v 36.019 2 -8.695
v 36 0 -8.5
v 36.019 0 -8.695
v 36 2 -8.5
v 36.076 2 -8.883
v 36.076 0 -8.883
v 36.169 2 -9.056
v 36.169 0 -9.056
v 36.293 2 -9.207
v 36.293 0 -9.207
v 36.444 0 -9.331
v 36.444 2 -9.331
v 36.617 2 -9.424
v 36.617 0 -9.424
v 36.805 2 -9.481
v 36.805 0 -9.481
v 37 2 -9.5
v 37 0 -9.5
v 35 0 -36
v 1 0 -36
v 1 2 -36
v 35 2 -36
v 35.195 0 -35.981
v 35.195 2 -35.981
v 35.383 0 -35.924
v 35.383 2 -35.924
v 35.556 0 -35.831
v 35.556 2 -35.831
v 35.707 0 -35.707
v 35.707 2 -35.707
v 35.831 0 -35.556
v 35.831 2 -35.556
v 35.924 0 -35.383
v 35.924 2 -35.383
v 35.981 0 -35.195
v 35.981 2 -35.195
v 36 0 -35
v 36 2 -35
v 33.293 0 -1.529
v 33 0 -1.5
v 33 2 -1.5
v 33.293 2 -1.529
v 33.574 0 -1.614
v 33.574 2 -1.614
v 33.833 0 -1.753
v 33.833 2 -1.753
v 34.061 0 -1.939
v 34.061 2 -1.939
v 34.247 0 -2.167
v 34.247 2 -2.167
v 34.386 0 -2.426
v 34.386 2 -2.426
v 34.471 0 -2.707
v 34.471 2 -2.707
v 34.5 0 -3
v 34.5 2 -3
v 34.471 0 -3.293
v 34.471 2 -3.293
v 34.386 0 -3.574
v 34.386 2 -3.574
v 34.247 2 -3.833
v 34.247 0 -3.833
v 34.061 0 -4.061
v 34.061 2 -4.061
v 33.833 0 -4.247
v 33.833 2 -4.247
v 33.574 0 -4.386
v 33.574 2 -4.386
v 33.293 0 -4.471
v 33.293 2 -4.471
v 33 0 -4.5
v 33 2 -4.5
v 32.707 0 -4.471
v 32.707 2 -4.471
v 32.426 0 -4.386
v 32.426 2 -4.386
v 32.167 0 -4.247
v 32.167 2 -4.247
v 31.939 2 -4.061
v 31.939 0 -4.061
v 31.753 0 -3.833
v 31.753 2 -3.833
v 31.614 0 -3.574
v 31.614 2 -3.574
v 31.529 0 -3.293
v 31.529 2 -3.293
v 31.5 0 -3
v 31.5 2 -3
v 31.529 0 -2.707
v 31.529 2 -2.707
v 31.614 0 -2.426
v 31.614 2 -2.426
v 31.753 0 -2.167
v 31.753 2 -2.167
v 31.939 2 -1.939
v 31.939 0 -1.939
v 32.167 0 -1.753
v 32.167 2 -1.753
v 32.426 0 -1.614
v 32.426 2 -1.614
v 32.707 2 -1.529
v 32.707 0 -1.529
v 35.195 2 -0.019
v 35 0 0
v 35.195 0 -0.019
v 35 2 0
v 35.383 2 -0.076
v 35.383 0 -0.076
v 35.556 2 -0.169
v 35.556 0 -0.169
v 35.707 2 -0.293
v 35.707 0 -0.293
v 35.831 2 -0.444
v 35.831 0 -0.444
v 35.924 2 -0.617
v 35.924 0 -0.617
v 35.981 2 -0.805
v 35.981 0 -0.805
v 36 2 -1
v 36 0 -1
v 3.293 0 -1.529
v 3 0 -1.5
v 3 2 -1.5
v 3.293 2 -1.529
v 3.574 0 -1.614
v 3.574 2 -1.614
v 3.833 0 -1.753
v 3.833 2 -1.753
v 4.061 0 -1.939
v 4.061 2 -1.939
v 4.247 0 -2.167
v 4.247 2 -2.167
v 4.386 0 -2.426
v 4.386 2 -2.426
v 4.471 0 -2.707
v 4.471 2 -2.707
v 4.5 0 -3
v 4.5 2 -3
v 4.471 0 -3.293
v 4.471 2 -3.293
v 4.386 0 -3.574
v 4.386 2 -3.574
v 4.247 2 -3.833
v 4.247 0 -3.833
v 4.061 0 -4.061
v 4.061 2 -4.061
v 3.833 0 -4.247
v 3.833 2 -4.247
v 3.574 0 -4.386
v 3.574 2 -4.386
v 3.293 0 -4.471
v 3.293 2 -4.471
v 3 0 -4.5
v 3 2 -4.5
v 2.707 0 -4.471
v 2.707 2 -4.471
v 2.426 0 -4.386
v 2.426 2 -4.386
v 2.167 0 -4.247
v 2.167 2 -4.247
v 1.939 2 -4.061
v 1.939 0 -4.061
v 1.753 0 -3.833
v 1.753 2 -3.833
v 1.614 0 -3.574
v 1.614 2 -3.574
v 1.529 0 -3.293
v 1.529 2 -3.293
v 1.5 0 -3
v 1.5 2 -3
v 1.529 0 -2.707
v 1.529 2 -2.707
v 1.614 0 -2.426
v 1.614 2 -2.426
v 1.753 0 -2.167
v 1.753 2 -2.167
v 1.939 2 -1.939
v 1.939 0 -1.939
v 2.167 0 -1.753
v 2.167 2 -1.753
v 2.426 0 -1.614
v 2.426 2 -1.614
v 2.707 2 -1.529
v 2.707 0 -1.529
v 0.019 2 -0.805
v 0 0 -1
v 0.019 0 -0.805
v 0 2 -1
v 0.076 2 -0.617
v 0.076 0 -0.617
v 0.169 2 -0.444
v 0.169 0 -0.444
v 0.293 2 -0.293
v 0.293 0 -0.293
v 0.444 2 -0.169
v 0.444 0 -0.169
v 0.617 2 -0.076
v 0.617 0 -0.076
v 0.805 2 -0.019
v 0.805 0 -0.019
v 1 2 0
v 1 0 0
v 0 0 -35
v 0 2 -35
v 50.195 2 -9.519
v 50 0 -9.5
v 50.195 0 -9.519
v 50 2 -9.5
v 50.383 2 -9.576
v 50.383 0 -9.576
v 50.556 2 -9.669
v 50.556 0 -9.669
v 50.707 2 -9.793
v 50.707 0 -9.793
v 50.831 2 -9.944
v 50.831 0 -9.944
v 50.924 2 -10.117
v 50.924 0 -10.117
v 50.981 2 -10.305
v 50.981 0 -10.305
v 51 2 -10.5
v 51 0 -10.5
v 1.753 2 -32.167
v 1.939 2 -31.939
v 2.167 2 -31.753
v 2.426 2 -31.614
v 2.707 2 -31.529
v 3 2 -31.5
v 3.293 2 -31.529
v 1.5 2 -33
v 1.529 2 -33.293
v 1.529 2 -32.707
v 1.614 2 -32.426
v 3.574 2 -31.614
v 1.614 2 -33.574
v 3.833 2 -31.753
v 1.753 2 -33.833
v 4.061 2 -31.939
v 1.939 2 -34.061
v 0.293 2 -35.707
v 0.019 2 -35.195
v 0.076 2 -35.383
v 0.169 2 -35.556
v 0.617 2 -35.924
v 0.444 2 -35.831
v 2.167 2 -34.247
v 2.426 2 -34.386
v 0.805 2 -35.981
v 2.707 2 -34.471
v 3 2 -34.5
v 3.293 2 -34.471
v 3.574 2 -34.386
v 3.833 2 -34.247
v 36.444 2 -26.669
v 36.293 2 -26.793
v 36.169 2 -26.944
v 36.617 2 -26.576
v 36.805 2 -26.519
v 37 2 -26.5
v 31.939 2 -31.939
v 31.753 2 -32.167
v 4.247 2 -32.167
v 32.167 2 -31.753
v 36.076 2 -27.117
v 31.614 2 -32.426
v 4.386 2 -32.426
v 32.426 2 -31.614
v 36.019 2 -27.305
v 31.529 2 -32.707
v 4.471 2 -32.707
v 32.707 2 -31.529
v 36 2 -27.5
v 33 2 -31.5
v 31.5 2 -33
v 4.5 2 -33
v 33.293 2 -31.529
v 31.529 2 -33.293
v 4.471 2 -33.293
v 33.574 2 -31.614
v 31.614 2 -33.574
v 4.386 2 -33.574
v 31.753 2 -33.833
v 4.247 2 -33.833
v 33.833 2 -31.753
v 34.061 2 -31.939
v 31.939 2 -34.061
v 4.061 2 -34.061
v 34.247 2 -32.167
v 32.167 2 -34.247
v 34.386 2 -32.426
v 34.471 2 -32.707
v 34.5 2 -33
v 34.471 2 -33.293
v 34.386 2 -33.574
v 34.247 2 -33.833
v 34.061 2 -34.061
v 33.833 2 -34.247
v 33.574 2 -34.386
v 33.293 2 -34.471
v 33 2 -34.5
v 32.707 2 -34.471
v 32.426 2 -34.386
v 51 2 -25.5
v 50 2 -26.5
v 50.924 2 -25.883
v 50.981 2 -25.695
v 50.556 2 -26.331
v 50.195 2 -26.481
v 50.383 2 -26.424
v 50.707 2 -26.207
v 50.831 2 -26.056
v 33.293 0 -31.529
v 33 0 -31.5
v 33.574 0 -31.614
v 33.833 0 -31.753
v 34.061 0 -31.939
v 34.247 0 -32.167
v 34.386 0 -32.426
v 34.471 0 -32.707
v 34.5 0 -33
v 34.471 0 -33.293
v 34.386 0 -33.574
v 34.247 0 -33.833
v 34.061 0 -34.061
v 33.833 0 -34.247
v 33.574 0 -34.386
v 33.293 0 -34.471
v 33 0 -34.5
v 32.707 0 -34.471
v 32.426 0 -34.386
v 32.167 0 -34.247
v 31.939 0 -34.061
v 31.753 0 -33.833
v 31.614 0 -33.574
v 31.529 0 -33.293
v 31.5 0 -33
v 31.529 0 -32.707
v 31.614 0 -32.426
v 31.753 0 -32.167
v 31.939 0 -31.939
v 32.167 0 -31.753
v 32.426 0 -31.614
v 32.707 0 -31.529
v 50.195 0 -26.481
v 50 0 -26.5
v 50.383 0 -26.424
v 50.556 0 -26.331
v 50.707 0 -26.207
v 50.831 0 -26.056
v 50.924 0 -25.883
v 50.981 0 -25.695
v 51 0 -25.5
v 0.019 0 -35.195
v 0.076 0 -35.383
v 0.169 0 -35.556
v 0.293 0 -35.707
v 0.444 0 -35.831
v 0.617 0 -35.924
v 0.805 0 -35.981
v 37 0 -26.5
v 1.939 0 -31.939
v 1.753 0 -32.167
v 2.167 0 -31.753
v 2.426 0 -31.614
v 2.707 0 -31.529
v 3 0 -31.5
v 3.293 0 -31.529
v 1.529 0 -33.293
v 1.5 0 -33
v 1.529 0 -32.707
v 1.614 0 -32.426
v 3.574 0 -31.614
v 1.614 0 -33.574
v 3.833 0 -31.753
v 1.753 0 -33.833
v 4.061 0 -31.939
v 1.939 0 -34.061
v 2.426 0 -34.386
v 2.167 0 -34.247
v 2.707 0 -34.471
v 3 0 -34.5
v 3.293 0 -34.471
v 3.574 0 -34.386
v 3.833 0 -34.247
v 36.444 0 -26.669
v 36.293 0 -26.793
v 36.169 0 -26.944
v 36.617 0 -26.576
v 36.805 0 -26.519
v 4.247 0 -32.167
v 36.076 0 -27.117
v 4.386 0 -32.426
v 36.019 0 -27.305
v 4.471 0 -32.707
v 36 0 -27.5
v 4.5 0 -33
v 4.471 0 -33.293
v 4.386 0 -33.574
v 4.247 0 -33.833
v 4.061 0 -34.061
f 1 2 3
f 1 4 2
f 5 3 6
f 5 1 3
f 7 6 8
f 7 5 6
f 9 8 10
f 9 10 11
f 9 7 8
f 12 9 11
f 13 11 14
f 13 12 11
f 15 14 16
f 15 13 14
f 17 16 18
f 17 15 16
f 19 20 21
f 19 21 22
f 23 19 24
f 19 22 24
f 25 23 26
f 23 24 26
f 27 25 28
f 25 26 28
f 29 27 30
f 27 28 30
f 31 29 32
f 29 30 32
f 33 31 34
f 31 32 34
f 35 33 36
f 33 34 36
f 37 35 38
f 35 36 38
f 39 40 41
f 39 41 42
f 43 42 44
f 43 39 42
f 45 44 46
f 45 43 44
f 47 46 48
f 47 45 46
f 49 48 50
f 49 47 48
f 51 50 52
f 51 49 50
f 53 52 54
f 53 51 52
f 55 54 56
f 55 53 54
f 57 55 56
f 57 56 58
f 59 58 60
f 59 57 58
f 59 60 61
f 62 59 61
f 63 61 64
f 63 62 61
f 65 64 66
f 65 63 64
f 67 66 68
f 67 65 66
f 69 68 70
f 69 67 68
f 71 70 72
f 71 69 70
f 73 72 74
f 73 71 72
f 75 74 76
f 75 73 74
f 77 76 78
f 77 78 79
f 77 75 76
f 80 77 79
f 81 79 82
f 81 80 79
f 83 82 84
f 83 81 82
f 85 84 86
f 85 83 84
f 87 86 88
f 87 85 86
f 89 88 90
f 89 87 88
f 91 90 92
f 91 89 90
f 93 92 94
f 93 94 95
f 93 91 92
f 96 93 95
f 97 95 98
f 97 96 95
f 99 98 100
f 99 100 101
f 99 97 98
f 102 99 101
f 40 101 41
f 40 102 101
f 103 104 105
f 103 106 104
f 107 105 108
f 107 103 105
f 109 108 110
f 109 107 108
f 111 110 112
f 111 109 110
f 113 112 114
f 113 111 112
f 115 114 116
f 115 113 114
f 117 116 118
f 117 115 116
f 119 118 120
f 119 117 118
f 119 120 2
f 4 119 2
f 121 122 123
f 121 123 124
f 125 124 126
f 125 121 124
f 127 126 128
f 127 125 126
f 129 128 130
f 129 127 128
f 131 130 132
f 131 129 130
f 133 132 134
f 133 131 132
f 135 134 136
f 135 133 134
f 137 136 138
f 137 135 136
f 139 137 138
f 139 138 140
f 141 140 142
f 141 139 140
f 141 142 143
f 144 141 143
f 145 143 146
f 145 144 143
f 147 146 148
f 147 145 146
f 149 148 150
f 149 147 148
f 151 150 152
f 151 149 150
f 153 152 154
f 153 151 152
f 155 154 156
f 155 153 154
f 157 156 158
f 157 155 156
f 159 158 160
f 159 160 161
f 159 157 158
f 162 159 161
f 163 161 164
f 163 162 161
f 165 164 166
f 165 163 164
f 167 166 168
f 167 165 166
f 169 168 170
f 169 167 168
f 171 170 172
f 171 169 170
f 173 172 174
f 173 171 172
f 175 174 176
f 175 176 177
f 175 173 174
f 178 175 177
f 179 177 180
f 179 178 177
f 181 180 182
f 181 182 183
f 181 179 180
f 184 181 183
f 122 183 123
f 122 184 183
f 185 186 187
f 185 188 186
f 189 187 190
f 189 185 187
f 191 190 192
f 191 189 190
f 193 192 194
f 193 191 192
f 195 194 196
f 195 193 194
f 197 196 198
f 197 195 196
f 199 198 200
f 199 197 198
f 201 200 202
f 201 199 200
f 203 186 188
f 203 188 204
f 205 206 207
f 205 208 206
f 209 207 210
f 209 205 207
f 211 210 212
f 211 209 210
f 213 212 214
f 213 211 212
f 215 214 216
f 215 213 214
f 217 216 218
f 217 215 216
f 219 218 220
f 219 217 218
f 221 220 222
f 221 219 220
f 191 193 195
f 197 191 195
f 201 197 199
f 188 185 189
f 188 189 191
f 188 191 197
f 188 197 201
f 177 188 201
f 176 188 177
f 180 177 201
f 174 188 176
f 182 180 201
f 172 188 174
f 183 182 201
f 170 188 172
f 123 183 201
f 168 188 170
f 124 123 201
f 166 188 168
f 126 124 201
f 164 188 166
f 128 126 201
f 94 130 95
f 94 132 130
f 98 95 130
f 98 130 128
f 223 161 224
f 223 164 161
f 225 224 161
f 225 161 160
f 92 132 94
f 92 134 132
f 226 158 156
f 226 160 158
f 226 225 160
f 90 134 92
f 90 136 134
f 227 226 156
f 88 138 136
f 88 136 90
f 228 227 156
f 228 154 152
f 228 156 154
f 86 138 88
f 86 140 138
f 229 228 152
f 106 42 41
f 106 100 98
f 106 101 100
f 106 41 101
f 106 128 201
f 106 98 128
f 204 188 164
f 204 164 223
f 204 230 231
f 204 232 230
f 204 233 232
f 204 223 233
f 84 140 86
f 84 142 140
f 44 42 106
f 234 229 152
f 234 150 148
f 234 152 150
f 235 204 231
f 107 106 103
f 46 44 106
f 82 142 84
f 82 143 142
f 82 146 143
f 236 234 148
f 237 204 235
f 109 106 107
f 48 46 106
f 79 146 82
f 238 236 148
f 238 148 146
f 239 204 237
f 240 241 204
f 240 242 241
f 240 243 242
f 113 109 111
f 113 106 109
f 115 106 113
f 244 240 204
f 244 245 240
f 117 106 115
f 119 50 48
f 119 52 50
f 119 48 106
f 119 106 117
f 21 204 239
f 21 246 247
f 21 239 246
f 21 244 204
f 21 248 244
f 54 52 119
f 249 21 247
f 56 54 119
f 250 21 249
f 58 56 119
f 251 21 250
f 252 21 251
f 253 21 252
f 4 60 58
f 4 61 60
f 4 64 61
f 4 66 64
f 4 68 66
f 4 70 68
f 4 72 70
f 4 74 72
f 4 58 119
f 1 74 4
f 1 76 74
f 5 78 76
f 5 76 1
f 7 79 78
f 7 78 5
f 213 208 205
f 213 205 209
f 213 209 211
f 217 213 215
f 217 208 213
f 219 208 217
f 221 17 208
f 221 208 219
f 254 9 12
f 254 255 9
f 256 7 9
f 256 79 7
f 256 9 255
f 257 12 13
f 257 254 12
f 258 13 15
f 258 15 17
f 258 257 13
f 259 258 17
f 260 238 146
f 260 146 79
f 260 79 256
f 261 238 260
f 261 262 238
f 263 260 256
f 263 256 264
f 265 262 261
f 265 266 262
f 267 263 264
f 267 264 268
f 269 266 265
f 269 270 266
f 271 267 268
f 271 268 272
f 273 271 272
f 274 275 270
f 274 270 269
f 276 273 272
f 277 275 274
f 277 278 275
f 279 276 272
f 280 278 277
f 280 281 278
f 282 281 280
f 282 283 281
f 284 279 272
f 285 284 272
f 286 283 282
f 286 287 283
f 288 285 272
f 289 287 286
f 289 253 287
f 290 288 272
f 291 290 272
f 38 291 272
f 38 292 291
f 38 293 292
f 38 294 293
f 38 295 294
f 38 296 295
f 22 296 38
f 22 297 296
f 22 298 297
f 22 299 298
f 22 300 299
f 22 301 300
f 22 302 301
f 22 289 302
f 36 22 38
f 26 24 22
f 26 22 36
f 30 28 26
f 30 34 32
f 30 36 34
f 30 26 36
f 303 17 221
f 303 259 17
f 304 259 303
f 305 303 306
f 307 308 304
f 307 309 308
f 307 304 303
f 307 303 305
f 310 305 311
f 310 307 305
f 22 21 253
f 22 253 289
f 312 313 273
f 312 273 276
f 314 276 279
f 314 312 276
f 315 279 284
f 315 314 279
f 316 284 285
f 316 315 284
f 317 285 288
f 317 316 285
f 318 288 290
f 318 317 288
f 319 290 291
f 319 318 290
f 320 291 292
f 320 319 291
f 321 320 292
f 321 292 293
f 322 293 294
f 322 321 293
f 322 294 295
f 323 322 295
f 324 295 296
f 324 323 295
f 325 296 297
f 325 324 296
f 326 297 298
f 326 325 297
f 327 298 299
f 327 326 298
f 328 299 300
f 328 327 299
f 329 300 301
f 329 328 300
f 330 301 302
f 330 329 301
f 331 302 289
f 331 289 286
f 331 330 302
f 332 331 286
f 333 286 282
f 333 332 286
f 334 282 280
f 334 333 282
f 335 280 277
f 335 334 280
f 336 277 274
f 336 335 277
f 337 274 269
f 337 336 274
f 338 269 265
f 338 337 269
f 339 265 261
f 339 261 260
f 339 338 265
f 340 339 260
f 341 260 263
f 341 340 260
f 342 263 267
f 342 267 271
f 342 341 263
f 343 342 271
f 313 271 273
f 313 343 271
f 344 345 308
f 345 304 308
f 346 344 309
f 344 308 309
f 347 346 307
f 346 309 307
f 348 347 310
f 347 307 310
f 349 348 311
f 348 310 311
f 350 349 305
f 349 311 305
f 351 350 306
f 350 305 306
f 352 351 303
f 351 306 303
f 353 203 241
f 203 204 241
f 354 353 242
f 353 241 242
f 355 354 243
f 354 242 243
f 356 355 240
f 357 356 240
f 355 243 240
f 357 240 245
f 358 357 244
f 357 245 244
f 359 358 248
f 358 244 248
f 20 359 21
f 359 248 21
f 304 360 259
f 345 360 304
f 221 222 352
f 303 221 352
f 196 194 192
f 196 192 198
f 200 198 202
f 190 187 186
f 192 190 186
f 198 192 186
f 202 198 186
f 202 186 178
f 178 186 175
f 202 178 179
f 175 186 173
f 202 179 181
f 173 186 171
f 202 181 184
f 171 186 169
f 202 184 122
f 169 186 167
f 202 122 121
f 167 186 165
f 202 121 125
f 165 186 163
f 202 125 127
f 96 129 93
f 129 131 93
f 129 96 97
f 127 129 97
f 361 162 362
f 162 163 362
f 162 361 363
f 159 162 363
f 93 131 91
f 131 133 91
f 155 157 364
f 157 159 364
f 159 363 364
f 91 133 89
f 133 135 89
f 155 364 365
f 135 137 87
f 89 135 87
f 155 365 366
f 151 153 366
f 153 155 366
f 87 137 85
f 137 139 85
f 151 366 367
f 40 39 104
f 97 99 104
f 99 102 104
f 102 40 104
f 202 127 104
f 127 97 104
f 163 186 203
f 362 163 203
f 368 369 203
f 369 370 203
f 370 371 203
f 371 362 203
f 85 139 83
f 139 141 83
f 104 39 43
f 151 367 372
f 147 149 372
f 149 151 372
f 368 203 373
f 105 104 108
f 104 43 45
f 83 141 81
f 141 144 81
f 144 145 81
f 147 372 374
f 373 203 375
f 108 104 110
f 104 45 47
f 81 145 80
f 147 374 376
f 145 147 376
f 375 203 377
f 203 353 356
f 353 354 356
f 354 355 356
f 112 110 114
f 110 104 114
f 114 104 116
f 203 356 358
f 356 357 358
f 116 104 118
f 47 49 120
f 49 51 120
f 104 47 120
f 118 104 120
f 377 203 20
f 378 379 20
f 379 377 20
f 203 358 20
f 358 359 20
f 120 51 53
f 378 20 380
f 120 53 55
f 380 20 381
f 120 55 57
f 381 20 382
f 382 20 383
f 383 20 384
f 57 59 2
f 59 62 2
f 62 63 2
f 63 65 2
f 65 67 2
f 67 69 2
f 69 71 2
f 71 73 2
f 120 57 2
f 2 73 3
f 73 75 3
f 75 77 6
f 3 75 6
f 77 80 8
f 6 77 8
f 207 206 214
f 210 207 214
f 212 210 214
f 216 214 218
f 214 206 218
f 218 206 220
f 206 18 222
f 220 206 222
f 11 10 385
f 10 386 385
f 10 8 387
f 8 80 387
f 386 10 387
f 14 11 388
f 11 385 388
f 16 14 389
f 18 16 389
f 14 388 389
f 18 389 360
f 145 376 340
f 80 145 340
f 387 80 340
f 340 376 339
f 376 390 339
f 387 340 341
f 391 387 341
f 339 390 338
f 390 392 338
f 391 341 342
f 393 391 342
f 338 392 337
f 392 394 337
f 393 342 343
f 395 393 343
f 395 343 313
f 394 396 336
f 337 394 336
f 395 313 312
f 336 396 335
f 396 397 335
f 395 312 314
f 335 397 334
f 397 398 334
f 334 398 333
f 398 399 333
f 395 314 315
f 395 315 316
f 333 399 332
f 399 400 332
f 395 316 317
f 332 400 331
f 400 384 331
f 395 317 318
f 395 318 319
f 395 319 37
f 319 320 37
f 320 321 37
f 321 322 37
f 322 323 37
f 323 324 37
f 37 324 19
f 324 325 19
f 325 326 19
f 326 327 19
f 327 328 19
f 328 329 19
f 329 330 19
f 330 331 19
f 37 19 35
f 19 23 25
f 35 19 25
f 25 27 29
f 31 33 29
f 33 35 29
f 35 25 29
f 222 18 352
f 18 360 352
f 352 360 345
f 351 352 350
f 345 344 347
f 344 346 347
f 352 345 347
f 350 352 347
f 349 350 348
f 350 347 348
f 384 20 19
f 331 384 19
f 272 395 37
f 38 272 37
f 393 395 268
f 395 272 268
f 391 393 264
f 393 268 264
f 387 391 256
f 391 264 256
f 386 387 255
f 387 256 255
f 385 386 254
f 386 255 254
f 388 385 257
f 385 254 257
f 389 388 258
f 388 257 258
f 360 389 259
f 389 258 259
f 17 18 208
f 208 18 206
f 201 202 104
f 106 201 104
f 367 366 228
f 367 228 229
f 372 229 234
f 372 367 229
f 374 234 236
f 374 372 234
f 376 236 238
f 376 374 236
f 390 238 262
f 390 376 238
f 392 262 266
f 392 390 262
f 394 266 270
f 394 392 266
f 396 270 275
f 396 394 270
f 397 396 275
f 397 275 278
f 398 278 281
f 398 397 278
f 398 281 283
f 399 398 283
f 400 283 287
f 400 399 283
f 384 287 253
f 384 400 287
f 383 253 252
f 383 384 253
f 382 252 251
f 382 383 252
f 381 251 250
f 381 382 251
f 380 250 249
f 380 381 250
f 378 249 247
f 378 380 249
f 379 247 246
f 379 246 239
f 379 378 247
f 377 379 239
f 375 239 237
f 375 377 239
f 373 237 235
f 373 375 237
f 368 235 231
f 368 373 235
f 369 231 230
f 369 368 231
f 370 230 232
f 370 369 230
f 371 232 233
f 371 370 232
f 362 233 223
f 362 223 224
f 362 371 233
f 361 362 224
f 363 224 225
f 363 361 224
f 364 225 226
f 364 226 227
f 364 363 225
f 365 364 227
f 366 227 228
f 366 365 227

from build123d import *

# Parameters (mm, degrees)
SKETCH1_W           = 36
SKETCH1_H           = 36
SKETCH1_R           = 1.5
SKETCH1_W_2         = 15
SKETCH1_H_2         = 17
BOSS_EXTRUDE1_DEPTH = 2
FILLET1_R           = 1


with BuildPart() as part:
    # Sketch1 → Boss-Extrude1 (new body)
    # profile 1 of 2: a face of its own
    with BuildSketch(Plane(origin=(0, 0, 0), x_dir=(1, 0, 0), z_dir=(0, 1, 0))):
        with Locations((18, 18)):
            Rectangle(SKETCH1_W, SKETCH1_H)
        with Locations(Location((33, 3, 0), (0, 0, 270))):
            Circle(SKETCH1_R, mode=Mode.SUBTRACT)
        with Locations(Location((3, 3, 0), (0, 0, 270))):
            Circle(SKETCH1_R, mode=Mode.SUBTRACT)
        with Locations(Location((33, 33, 0), (0, 0, 270))):
            Circle(SKETCH1_R, mode=Mode.SUBTRACT)
        with Locations(Location((3, 33, 0), (0, 0, 270))):
            Circle(SKETCH1_R, mode=Mode.SUBTRACT)
    # profile 2 of 2: a face of its own
    with BuildSketch(Plane(origin=(0, 0, 0), x_dir=(1, 0, 0), z_dir=(0, 1, 0))):
        with Locations((43.5, 18)):
            Rectangle(SKETCH1_W_2, SKETCH1_H_2)
    extrude(amount=BOSS_EXTRUDE1_DEPTH)

    # Fillet1
    fillet1_edges = [part.edges().sort_by_distance(p)[0] for p in [
        (0, 1, 0),
        (0, 1, -36),
        (36, 1, -36),
        (36, 1, -26.5),
        (51, 1, -26.5),
        (51, 1, -9.5),
        (36, 1, -9.5),
        (36, 1, 0),
    ]]
    fillet(fillet1_edges, radius=FILLET1_R)


solid = part.part
